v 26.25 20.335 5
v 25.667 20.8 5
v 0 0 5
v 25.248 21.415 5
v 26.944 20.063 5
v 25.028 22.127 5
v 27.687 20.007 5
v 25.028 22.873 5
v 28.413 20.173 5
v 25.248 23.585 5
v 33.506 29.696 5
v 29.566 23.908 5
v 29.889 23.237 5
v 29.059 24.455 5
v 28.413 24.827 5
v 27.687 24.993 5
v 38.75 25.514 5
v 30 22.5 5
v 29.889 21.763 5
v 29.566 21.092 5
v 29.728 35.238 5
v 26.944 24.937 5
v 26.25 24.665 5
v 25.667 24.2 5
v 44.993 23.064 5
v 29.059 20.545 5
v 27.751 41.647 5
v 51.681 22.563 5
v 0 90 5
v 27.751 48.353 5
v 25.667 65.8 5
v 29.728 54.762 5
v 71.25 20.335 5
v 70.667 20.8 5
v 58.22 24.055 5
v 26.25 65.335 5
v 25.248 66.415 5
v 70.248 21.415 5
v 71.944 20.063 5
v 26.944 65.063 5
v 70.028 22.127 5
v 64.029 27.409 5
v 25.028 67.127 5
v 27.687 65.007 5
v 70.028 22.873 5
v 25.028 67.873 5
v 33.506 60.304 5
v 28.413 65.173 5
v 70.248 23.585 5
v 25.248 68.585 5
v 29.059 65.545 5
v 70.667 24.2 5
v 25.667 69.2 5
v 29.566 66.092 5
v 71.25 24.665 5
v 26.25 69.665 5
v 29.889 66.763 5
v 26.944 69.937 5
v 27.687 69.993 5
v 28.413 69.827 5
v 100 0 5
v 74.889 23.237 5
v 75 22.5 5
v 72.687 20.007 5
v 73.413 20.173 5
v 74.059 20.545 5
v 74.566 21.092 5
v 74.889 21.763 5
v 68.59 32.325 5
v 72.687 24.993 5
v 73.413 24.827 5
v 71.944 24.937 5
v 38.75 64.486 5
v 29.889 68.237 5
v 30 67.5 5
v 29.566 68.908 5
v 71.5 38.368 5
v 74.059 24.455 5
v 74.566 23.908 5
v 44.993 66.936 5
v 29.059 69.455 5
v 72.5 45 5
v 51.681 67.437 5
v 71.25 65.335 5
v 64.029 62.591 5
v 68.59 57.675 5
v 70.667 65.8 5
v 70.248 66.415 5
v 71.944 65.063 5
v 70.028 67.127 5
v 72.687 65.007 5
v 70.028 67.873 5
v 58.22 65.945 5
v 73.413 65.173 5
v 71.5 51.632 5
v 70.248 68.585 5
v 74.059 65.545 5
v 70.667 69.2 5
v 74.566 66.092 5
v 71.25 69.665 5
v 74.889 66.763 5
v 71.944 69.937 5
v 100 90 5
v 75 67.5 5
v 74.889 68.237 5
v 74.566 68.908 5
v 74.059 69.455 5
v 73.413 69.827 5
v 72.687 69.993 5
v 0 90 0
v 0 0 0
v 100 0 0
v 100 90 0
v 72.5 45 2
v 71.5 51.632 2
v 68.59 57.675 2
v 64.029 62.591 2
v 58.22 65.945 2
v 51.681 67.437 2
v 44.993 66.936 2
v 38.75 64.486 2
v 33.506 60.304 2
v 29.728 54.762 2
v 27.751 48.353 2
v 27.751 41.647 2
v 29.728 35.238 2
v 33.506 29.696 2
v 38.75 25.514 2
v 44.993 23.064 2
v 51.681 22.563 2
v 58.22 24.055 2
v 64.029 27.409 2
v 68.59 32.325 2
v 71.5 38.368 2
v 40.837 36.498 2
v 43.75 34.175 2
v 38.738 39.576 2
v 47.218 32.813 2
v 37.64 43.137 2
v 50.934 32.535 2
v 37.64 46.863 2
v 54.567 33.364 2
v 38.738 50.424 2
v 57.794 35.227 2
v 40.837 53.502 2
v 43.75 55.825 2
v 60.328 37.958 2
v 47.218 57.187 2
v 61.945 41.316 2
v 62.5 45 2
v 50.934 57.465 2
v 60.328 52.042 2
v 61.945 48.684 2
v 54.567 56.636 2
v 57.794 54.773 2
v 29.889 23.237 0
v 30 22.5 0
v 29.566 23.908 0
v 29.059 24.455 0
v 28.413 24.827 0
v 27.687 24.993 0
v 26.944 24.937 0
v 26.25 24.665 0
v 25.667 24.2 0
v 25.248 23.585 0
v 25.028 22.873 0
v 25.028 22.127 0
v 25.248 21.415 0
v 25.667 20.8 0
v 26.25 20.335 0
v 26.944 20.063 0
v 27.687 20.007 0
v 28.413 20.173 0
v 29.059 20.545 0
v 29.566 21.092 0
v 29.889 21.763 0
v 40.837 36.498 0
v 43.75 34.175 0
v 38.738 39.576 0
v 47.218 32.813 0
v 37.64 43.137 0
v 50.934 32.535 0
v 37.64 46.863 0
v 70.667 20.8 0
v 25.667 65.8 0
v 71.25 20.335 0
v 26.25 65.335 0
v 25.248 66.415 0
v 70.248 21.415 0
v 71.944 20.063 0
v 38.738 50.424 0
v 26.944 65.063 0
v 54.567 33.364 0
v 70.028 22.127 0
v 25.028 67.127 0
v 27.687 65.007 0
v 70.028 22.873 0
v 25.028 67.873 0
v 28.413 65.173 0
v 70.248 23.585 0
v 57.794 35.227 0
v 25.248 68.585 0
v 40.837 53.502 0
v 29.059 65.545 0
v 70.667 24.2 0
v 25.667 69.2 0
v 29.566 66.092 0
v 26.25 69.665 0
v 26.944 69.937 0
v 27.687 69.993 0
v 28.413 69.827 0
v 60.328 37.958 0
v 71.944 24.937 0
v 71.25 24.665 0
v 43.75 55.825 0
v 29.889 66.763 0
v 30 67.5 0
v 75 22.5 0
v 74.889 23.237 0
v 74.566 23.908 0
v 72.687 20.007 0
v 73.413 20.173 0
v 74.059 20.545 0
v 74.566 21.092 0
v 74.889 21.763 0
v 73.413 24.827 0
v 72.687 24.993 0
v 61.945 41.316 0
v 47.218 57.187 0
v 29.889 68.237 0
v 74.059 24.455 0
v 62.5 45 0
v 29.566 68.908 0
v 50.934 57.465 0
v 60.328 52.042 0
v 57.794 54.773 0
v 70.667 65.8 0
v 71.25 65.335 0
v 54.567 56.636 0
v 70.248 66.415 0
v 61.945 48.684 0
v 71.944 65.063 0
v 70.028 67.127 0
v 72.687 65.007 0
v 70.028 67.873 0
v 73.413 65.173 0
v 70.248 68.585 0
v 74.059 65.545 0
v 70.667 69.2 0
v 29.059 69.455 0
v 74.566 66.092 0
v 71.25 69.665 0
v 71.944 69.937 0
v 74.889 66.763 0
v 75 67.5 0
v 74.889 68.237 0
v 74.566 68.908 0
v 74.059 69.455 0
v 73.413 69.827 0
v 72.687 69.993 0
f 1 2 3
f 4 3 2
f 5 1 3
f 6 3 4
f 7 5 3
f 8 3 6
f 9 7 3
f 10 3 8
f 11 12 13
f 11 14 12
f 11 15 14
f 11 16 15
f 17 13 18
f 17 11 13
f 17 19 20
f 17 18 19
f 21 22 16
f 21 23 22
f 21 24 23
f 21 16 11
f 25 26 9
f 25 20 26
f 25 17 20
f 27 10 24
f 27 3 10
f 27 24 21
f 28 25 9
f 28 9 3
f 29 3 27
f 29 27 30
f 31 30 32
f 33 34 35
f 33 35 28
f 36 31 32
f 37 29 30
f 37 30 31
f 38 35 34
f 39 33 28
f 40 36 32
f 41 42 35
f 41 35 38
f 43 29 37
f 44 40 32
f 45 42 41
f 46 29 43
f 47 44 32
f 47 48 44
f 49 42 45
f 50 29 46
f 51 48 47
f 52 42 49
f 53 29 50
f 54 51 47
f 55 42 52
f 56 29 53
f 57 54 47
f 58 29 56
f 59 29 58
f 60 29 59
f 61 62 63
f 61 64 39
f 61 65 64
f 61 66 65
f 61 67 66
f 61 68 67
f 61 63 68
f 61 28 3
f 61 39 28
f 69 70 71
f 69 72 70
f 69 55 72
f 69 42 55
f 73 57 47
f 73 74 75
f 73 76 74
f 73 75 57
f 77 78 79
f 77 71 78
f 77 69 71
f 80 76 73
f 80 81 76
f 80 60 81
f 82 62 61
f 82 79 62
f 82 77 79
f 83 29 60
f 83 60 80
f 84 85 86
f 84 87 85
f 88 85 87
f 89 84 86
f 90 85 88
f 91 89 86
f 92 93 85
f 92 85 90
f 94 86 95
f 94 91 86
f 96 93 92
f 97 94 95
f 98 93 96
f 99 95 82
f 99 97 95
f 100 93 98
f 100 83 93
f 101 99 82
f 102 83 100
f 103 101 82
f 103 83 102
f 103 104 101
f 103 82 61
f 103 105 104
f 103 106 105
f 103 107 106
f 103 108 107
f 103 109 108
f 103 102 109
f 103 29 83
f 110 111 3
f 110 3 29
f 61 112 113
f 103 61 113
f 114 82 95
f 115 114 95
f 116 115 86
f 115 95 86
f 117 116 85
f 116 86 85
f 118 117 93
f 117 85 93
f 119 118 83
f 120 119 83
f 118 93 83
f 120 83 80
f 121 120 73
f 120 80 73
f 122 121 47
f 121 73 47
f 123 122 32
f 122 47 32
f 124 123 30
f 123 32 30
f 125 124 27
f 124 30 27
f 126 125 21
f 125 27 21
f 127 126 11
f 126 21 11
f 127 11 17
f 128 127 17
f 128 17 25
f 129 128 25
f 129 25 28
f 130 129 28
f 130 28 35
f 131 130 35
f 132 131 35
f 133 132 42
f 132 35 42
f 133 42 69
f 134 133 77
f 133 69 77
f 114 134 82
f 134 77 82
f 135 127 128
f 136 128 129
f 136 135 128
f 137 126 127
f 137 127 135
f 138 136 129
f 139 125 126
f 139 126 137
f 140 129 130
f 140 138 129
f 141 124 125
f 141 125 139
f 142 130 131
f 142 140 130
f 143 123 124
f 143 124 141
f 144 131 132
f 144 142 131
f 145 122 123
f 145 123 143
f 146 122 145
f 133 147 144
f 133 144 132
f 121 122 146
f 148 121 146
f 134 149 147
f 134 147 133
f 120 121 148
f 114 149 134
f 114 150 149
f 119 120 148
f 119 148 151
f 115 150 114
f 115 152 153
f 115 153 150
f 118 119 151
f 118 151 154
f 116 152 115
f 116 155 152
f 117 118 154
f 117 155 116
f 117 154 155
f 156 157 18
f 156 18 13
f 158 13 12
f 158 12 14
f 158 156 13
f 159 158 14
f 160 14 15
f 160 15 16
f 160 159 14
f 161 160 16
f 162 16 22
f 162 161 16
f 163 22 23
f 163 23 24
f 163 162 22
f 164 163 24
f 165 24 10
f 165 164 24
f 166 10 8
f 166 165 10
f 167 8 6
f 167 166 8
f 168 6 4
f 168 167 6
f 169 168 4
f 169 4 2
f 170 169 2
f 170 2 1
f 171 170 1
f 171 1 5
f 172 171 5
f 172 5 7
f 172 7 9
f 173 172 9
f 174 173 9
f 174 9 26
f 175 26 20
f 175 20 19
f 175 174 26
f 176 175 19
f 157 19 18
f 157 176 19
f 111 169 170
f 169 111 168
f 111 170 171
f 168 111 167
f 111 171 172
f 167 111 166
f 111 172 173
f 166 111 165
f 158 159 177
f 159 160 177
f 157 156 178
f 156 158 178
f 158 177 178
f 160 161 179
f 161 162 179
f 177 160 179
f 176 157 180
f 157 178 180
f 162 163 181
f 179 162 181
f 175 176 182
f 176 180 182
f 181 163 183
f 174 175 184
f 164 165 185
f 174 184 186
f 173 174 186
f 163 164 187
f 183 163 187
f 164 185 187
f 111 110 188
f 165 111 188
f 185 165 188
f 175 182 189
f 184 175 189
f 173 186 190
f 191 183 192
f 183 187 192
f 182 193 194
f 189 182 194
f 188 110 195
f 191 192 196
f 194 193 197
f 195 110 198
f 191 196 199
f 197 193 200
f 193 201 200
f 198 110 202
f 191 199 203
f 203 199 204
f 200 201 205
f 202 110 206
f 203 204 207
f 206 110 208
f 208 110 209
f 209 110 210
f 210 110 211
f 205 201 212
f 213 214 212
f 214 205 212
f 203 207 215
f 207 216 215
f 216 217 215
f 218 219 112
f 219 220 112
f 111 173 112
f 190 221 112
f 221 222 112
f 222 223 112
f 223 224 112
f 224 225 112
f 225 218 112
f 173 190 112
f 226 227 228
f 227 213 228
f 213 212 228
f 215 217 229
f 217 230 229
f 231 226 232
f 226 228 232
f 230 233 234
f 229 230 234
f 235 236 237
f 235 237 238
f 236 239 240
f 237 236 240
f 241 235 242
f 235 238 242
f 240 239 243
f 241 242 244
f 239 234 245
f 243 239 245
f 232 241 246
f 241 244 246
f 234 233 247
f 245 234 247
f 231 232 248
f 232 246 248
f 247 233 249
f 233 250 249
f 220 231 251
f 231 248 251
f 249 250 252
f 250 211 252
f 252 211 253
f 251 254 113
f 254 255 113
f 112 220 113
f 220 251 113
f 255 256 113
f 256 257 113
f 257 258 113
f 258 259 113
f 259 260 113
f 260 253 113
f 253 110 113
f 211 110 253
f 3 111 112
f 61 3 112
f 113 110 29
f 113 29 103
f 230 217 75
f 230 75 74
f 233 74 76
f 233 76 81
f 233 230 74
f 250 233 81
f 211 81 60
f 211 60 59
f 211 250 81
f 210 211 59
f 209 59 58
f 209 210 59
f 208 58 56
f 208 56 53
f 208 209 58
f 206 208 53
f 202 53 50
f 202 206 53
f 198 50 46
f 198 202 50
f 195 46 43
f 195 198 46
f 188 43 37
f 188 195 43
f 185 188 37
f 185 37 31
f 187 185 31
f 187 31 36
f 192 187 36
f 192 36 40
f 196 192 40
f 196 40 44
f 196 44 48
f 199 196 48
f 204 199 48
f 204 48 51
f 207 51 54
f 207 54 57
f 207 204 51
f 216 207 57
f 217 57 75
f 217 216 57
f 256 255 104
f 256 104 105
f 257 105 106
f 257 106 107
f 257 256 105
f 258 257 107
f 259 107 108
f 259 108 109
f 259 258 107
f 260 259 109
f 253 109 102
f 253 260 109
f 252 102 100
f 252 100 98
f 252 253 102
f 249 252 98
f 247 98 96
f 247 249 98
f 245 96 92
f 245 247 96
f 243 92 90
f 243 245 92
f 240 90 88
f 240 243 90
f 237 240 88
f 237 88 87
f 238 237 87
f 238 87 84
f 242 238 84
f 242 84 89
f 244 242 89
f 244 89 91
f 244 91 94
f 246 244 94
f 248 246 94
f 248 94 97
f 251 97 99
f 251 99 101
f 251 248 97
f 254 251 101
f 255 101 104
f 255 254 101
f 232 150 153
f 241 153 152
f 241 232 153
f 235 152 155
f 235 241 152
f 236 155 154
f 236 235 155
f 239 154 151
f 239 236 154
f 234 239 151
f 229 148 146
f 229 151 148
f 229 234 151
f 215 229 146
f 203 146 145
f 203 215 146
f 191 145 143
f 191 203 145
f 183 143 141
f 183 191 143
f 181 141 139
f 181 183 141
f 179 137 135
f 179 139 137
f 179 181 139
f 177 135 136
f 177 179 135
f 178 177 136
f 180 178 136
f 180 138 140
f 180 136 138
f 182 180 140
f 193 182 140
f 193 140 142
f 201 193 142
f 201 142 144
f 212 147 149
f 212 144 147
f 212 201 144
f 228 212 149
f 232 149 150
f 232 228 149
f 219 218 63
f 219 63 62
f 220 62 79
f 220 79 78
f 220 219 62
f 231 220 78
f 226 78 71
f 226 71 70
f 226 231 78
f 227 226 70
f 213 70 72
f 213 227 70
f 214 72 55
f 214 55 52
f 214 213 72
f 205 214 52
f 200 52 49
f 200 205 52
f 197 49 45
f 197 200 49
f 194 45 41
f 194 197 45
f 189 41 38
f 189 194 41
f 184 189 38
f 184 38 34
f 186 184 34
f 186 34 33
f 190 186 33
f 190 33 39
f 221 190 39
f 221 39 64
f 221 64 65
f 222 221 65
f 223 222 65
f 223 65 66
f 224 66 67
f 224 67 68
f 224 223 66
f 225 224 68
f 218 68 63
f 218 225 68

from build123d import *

# Parameters (mm, degrees)
SKETCH1_W           = 100
SKETCH1_H           = 90
SKETCH1_R           = 2.5
SKETCH1_R_2         = 12.5
BOSS_EXTRUDE1_DEPTH = 5
SKETCH3_R           = 22.5
CUT_EXTRUDE2_DEPTH  = 3


with BuildPart() as part:
    # Sketch1 → Boss-Extrude1 (new body)
    with BuildSketch(Plane.XY):
        with Locations((50, 45)):
            Rectangle(SKETCH1_W, SKETCH1_H)
        with Locations((27.5, 67.5)):
            Circle(SKETCH1_R, mode=Mode.SUBTRACT)
        with Locations((72.5, 67.5)):
            Circle(SKETCH1_R, mode=Mode.SUBTRACT)
        with Locations((72.5, 22.5)):
            Circle(SKETCH1_R, mode=Mode.SUBTRACT)
        with Locations((27.5, 22.5)):
            Circle(SKETCH1_R, mode=Mode.SUBTRACT)
        with Locations((50, 45)):
            Circle(SKETCH1_R_2, mode=Mode.SUBTRACT)
    extrude(amount=BOSS_EXTRUDE1_DEPTH)

    # Sketch3 → Cut-Extrude2 (cut)
    with BuildSketch(Plane.XY.offset(5)):
        with Locations((50, 45)):
            Circle(SKETCH3_R)
    extrude(amount=-CUT_EXTRUDE2_DEPTH, mode=Mode.SUBTRACT)


solid = part.part
